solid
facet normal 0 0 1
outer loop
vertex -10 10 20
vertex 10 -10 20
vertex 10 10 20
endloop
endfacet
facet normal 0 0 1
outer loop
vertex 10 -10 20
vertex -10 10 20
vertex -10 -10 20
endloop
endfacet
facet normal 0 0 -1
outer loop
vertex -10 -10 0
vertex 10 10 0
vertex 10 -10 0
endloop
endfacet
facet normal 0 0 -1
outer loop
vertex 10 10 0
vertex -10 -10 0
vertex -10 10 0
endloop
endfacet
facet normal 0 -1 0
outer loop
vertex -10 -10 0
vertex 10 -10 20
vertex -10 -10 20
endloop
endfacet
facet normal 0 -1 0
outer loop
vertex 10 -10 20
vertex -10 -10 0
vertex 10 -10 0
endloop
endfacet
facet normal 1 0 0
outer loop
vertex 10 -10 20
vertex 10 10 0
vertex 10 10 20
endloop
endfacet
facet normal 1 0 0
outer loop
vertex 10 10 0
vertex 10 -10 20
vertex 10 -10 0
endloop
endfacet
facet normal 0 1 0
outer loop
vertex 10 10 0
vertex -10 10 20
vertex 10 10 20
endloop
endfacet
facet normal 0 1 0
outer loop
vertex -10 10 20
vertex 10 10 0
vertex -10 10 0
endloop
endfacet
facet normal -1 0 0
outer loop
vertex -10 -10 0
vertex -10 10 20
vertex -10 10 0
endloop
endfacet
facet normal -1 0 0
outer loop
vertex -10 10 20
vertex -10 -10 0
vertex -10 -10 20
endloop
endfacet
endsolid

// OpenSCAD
// text_on_cube.scad - Example for text() usage in OpenSCAD

echo(version=version());


cube_size = 20;


translate([0,0, cube_size/2]) {
union() {
color("gray") cube(cube_size, center = true);
};
};
